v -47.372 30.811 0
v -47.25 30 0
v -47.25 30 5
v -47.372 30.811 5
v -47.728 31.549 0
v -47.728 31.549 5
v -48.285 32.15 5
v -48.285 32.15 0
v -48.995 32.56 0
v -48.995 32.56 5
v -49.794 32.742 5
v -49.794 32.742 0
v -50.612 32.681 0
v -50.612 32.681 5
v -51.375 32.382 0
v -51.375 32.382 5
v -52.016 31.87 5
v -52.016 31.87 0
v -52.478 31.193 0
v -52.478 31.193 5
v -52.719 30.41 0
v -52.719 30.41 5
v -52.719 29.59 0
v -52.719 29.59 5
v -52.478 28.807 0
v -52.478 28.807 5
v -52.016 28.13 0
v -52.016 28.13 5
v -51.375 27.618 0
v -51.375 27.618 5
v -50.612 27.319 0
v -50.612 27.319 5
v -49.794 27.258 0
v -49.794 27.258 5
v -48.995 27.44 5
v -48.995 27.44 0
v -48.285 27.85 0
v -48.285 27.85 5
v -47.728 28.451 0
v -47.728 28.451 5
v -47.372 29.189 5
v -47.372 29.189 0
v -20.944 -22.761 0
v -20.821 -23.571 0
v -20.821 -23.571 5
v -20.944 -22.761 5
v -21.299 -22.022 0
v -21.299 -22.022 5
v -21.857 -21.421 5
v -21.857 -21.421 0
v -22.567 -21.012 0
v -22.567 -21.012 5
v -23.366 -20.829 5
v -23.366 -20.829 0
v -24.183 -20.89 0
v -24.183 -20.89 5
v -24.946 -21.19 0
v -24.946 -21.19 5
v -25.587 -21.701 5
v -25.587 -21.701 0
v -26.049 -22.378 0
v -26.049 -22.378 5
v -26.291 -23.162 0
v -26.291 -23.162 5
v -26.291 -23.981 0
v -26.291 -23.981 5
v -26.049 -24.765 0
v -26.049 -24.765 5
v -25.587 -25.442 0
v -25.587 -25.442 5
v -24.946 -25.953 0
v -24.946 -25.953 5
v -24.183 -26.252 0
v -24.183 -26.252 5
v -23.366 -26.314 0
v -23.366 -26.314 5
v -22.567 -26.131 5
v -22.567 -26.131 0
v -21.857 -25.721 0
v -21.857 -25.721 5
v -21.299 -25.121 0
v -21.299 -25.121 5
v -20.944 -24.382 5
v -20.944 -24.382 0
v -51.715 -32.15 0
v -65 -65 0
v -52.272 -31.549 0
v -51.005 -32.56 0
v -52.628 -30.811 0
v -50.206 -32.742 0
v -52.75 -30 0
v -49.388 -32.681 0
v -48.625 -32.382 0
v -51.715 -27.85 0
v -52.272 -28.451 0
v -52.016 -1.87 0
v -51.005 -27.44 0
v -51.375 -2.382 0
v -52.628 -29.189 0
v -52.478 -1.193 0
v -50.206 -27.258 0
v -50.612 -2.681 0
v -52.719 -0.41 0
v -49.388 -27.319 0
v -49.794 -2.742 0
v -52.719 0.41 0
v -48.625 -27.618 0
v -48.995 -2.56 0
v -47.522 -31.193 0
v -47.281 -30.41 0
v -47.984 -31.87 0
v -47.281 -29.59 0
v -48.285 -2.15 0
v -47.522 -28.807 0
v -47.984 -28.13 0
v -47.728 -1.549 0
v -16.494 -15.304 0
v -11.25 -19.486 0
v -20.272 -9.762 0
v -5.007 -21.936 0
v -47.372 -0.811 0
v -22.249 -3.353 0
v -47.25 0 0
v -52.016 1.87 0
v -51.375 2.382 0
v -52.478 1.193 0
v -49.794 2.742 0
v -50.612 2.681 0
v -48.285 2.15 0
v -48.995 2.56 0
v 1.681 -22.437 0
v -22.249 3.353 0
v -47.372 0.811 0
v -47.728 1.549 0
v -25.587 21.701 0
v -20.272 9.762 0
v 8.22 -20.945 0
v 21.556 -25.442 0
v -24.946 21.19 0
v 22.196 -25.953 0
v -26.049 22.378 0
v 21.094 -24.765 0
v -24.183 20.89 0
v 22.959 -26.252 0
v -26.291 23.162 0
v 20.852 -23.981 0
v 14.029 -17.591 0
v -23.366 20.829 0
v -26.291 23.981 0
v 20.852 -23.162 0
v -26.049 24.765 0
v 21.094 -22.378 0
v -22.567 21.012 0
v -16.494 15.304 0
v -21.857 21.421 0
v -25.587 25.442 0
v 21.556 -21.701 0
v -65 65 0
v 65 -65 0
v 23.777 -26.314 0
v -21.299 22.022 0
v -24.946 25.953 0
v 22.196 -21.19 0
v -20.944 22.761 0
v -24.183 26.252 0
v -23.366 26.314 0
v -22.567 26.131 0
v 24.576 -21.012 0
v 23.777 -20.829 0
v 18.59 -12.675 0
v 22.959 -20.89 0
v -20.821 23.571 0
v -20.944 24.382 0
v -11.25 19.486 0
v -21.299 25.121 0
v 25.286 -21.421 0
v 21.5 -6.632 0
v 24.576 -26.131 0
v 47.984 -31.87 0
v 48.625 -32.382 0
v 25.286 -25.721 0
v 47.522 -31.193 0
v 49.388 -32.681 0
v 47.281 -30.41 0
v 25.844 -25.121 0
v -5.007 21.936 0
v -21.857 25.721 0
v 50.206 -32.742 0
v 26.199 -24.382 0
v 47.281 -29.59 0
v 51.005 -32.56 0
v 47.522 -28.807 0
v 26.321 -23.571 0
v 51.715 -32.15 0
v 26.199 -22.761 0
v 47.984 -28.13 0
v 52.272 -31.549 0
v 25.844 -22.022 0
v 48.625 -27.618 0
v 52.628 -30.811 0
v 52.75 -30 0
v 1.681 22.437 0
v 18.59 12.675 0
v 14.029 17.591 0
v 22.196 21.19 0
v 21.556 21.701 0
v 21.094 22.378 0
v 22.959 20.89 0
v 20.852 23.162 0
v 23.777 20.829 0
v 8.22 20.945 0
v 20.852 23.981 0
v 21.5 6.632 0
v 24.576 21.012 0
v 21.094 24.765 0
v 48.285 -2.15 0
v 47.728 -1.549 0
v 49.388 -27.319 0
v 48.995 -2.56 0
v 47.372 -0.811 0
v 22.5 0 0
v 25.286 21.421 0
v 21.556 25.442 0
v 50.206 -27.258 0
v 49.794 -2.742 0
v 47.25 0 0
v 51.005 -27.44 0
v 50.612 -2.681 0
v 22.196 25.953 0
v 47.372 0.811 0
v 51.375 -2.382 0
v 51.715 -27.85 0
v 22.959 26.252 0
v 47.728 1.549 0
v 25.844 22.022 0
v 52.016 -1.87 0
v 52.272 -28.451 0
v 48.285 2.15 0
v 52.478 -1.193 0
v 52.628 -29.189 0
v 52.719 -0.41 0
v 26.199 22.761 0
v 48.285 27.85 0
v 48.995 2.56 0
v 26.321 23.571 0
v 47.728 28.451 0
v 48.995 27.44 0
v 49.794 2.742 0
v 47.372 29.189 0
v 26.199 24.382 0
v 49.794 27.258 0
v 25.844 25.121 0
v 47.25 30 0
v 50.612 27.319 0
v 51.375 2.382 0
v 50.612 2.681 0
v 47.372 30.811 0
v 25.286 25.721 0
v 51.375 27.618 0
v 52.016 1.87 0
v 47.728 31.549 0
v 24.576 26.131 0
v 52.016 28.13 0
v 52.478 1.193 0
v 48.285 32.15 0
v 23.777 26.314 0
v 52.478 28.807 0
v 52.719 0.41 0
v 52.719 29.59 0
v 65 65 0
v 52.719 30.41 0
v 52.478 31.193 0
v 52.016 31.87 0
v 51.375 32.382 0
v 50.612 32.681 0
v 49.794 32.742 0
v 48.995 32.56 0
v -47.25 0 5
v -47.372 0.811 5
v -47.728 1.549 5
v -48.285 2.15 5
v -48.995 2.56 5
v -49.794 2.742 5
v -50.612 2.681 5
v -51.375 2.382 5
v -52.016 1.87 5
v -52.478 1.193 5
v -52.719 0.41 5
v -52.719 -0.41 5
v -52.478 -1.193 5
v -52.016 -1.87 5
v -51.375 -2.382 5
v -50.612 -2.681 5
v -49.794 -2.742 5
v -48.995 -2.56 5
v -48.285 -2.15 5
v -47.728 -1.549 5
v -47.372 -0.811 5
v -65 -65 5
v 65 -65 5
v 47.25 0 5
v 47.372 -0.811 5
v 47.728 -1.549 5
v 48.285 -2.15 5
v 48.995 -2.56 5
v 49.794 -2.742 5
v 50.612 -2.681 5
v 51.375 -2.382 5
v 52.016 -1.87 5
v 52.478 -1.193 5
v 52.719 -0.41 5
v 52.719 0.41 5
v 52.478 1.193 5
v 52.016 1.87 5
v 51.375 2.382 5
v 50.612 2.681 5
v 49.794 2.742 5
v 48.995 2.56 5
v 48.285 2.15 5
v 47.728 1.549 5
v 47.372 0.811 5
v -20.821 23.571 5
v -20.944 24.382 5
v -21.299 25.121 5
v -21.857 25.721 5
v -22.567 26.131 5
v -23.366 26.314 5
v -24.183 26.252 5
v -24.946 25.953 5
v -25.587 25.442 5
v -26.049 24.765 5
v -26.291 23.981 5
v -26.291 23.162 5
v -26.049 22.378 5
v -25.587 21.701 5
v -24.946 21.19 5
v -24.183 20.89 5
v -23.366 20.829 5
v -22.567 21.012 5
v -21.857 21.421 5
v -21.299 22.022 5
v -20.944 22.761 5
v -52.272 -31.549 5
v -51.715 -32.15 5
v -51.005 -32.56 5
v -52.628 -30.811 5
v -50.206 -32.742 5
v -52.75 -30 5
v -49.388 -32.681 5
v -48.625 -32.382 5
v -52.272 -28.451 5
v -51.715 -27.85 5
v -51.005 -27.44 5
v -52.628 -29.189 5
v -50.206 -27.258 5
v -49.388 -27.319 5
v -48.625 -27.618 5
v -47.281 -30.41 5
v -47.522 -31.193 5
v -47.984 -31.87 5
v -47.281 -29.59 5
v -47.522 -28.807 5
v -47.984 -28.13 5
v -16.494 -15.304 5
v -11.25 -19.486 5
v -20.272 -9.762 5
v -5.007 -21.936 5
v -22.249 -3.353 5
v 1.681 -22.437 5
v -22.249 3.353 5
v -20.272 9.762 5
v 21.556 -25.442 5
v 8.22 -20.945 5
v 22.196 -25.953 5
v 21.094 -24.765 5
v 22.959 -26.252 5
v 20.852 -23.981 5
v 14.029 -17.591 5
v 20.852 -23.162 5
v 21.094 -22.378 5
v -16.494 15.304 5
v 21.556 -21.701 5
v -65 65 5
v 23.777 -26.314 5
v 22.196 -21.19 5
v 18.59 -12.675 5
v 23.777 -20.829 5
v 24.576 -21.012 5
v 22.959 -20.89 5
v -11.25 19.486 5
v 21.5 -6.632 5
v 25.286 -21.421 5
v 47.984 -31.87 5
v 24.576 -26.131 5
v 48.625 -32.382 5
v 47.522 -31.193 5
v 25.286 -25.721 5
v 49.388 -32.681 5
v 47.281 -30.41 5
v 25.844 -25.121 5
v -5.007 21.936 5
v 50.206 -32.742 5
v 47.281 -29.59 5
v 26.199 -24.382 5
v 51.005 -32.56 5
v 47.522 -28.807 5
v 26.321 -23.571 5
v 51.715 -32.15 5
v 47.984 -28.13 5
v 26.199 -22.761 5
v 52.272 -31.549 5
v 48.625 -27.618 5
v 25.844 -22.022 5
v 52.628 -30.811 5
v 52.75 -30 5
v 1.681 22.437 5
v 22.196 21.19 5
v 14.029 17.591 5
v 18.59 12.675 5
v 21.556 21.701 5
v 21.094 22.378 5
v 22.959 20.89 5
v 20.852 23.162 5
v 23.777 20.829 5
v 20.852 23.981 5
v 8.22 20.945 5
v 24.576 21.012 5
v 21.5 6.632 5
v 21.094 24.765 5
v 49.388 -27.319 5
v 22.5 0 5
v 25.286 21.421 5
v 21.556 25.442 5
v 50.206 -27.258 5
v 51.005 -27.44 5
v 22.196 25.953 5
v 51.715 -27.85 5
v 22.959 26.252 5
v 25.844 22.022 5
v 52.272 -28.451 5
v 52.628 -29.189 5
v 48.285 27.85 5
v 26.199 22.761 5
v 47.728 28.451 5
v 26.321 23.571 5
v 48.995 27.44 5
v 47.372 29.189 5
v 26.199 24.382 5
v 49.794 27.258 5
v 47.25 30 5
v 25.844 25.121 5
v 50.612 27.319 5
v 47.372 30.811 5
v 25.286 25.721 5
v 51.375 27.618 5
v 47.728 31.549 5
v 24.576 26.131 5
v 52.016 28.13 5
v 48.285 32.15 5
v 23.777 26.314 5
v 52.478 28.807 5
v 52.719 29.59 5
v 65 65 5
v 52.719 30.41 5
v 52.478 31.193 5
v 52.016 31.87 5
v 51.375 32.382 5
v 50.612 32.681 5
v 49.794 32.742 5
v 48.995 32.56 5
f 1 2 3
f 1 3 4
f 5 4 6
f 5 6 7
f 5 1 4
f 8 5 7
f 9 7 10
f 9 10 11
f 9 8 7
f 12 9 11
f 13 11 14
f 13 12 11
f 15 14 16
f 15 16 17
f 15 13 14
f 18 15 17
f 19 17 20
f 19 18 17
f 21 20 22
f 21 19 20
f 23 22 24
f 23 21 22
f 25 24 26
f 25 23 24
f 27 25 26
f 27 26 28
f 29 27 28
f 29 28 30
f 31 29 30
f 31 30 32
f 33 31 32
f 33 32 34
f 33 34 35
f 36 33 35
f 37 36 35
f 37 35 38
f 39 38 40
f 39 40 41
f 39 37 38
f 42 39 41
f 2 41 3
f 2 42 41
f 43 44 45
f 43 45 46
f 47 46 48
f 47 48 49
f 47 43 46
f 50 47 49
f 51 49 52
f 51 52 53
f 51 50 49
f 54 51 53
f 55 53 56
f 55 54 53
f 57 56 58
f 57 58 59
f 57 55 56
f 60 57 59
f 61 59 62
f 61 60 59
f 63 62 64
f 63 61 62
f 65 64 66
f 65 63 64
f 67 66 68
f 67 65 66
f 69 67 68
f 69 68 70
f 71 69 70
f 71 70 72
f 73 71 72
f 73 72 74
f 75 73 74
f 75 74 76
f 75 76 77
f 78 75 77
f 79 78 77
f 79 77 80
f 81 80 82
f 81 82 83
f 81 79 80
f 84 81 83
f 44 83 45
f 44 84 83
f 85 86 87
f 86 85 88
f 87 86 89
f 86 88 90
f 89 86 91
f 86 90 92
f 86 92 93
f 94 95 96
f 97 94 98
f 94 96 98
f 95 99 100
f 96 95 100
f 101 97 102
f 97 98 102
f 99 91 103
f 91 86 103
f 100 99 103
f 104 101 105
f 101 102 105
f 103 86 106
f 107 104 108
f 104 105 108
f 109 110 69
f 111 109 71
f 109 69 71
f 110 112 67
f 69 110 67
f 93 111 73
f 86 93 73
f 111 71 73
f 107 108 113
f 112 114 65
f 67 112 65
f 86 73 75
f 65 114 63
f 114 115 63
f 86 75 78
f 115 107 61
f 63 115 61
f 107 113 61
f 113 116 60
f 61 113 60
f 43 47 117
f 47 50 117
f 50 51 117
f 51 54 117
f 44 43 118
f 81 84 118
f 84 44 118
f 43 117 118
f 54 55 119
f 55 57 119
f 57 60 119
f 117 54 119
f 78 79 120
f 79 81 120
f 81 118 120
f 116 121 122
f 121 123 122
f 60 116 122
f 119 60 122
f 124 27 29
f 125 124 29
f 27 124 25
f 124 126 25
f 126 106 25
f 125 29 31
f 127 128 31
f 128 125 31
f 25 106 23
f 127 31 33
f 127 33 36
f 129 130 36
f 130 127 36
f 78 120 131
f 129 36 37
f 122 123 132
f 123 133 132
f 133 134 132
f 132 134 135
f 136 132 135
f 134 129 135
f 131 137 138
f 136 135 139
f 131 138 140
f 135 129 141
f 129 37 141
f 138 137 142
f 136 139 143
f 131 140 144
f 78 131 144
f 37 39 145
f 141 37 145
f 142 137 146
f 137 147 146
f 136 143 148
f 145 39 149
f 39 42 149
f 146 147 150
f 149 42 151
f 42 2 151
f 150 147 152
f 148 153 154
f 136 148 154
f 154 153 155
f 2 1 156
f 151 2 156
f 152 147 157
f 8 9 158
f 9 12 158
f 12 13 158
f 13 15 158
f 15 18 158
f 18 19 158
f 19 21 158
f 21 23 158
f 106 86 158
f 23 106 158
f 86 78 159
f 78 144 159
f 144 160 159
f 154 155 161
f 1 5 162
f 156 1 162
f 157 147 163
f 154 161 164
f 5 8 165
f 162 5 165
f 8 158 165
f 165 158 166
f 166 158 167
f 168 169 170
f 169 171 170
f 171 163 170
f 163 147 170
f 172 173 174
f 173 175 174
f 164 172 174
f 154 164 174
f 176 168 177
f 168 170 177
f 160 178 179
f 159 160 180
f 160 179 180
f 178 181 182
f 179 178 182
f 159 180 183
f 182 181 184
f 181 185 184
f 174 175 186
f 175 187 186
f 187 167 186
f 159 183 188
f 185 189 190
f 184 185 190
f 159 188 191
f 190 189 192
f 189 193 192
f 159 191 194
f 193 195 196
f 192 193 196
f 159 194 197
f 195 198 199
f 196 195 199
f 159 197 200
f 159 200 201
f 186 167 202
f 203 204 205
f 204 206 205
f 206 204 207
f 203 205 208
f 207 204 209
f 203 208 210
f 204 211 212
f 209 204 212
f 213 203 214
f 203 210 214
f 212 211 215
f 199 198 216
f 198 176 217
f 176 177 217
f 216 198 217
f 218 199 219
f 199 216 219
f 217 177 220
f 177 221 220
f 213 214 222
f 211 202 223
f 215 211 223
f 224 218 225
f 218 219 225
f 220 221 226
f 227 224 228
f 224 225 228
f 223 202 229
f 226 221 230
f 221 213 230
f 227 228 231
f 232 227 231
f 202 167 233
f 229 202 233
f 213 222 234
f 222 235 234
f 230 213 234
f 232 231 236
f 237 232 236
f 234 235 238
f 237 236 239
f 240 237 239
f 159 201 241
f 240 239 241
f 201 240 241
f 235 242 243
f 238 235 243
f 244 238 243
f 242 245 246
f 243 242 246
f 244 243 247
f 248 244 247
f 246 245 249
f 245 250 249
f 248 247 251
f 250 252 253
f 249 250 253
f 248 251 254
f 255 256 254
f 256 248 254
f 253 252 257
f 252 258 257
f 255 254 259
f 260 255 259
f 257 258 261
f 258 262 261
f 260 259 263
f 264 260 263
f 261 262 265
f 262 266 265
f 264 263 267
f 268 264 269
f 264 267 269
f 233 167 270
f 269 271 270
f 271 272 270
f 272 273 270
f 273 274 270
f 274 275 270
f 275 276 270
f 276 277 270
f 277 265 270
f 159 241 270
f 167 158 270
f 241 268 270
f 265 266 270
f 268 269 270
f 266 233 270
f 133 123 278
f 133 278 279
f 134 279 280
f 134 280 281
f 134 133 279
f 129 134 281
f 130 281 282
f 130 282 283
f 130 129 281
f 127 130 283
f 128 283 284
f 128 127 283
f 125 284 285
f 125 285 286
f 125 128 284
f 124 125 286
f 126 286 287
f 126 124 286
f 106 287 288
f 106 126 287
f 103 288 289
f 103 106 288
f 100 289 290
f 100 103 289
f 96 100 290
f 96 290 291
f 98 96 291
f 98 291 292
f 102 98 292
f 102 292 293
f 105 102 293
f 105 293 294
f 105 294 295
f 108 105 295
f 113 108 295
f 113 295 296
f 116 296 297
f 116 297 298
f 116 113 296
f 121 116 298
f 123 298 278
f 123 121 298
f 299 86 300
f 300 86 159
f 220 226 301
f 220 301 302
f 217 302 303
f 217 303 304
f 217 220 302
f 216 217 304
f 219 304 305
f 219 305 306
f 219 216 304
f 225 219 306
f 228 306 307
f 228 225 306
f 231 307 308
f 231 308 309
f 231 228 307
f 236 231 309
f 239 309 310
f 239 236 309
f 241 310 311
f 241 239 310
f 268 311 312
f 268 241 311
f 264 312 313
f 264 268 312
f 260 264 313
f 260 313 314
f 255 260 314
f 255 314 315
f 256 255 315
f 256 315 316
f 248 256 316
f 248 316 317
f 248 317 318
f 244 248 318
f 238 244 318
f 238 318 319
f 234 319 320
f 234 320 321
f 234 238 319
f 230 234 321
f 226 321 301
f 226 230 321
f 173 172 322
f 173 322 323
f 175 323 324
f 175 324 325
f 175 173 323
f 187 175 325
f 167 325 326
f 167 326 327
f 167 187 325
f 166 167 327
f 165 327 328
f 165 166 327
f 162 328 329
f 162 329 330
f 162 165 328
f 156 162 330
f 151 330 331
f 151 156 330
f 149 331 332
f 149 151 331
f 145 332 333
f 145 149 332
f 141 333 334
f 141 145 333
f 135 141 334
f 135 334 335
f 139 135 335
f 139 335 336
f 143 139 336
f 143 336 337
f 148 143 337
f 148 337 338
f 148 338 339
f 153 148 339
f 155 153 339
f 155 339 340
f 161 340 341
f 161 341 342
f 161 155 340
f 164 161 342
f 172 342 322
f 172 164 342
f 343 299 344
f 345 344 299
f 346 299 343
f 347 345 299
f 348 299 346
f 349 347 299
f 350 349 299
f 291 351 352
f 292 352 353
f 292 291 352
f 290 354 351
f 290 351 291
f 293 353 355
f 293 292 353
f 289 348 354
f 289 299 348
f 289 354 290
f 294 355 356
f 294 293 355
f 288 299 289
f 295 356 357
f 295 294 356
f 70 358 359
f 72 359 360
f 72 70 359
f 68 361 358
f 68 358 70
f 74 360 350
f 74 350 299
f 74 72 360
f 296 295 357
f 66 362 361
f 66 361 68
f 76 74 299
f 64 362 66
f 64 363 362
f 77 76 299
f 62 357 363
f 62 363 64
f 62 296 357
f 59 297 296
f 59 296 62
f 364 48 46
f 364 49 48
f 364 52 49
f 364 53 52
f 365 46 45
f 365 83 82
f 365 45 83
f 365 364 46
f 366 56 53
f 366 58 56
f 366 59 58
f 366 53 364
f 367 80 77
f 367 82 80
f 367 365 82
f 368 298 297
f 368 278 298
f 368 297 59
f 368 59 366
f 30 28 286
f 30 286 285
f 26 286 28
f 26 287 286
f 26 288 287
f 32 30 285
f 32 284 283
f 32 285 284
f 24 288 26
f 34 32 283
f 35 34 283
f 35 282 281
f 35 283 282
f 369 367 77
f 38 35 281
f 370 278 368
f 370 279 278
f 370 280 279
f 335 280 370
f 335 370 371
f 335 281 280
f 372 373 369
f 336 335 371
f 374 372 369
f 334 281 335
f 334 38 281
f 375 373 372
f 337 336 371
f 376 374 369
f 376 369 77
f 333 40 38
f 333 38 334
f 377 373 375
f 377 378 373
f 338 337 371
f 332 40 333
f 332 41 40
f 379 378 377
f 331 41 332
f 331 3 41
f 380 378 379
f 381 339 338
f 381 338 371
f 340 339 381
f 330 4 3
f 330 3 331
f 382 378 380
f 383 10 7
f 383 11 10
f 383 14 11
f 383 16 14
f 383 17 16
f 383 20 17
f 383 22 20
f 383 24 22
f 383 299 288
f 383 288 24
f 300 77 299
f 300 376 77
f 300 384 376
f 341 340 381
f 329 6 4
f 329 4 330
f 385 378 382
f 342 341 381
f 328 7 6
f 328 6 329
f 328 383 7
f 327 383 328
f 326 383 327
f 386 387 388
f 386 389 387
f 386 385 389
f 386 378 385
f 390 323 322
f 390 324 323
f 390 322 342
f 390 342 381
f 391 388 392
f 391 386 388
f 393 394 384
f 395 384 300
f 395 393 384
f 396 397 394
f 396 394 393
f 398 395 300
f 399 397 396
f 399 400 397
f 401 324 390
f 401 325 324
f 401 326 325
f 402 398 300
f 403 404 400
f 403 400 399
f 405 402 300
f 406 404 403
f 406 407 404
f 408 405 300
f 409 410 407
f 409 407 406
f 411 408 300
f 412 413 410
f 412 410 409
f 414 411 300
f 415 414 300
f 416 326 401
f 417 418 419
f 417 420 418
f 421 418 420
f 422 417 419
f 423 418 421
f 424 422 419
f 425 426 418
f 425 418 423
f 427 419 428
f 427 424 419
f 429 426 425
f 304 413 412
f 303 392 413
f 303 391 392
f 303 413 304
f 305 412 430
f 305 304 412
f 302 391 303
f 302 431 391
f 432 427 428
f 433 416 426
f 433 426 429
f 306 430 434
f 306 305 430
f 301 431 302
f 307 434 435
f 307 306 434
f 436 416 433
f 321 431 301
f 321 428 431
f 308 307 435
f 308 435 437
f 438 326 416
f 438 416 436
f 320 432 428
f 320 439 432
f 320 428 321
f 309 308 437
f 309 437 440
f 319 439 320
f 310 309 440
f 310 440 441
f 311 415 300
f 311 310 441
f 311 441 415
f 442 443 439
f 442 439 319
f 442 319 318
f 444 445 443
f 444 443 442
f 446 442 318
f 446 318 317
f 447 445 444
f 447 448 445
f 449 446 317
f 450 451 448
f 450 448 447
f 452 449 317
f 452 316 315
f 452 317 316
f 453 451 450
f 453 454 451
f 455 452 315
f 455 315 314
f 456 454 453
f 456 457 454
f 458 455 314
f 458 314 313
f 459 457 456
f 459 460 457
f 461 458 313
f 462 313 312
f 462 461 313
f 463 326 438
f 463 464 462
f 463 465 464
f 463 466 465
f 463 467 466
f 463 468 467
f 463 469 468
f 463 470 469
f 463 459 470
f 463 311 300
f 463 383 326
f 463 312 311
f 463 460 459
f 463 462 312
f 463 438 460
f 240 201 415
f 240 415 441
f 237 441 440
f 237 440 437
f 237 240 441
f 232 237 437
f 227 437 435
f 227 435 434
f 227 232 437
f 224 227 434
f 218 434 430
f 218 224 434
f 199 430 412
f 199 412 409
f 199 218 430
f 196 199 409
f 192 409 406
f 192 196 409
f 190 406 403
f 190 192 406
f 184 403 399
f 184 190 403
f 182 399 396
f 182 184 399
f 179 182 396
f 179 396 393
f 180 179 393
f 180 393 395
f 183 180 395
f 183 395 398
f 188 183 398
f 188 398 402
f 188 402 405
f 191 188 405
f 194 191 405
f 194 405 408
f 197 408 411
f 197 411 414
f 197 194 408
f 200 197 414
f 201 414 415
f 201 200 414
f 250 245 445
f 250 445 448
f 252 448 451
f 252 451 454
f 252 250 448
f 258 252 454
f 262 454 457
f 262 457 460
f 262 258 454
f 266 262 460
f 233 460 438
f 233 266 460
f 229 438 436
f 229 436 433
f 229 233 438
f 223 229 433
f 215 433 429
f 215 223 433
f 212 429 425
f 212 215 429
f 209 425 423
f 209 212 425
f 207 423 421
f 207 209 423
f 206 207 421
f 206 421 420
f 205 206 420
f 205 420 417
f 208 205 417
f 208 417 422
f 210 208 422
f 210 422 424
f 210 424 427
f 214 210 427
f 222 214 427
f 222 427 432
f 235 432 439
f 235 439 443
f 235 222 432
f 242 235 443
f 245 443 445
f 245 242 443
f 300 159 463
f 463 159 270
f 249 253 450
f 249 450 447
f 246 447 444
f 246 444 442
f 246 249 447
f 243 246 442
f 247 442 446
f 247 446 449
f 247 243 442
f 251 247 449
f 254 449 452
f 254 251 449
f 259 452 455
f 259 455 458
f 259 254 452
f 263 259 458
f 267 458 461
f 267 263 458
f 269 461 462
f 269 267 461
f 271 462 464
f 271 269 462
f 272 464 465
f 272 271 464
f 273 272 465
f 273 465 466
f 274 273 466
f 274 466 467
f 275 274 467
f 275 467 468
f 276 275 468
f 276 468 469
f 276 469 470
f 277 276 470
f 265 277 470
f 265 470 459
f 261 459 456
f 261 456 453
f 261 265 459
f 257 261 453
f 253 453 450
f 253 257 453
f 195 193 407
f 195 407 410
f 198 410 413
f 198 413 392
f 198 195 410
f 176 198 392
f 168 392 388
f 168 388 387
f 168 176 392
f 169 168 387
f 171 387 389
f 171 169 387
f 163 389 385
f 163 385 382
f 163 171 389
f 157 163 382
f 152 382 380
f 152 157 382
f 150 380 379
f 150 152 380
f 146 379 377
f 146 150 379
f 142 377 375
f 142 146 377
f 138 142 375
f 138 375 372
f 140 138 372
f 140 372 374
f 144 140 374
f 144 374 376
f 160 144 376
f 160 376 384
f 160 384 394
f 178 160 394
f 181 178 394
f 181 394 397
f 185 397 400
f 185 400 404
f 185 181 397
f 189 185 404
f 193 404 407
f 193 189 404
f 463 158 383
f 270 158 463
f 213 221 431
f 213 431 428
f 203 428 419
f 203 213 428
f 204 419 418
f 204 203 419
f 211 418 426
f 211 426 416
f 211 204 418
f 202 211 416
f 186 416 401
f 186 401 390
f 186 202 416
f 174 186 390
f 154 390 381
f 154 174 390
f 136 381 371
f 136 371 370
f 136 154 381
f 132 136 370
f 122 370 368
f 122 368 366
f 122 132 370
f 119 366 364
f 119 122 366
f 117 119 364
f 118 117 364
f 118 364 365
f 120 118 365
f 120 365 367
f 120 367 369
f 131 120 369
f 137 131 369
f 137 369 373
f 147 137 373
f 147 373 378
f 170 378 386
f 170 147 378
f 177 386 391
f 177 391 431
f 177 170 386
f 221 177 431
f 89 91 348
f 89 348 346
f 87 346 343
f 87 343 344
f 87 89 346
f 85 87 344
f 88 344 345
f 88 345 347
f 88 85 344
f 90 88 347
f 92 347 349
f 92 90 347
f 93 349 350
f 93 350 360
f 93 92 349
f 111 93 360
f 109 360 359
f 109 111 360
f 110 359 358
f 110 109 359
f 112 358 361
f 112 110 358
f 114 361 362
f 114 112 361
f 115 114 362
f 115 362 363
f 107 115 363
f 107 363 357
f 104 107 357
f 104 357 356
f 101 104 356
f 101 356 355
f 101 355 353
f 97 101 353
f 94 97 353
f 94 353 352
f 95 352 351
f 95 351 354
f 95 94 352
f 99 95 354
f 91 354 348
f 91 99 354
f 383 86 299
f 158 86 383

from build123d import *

# Parameters (mm, degrees)
SKETCH_1_W      = 130
SKETCH_1_H      = 130
SKETCH_1_R      = 22.5
SKETCH_1_R_2    = 2.75
EXTRUDE_1_DEPTH = 5


with BuildPart() as part:
    # 草图1 → 凸台-拉伸1 (new body)
    with BuildSketch(Plane.XY):
        Rectangle(SKETCH_1_W, SKETCH_1_H)
        Circle(SKETCH_1_R, mode=Mode.SUBTRACT)
        with Locations((-23.571404551, 23.571404551)):
            Circle(SKETCH_1_R_2, mode=Mode.SUBTRACT)
        with Locations((23.571404551, 23.571404551)):
            Circle(SKETCH_1_R_2, mode=Mode.SUBTRACT)
        with Locations((23.571404551, -23.571404551)):
            Circle(SKETCH_1_R_2, mode=Mode.SUBTRACT)
        with Locations((-23.571404551, -23.571404551)):
            Circle(SKETCH_1_R_2, mode=Mode.SUBTRACT)
        with Locations((-50, 30)):
            Circle(SKETCH_1_R_2, mode=Mode.SUBTRACT)
        with Locations((-50, 0)):
            Circle(SKETCH_1_R_2, mode=Mode.SUBTRACT)
        with Locations(Location((-50, -30, 0), (0, 0, 180))):
            Circle(SKETCH_1_R_2, mode=Mode.SUBTRACT)
        with Locations((50, -30)):
            Circle(SKETCH_1_R_2, mode=Mode.SUBTRACT)
        with Locations(Location((50, 0, 0), (0, 0, 180))):
            Circle(SKETCH_1_R_2, mode=Mode.SUBTRACT)
        with Locations(Location((50, 30, 0), (0, 0, 180))):
            Circle(SKETCH_1_R_2, mode=Mode.SUBTRACT)
    extrude(amount=EXTRUDE_1_DEPTH)


solid = part.part
